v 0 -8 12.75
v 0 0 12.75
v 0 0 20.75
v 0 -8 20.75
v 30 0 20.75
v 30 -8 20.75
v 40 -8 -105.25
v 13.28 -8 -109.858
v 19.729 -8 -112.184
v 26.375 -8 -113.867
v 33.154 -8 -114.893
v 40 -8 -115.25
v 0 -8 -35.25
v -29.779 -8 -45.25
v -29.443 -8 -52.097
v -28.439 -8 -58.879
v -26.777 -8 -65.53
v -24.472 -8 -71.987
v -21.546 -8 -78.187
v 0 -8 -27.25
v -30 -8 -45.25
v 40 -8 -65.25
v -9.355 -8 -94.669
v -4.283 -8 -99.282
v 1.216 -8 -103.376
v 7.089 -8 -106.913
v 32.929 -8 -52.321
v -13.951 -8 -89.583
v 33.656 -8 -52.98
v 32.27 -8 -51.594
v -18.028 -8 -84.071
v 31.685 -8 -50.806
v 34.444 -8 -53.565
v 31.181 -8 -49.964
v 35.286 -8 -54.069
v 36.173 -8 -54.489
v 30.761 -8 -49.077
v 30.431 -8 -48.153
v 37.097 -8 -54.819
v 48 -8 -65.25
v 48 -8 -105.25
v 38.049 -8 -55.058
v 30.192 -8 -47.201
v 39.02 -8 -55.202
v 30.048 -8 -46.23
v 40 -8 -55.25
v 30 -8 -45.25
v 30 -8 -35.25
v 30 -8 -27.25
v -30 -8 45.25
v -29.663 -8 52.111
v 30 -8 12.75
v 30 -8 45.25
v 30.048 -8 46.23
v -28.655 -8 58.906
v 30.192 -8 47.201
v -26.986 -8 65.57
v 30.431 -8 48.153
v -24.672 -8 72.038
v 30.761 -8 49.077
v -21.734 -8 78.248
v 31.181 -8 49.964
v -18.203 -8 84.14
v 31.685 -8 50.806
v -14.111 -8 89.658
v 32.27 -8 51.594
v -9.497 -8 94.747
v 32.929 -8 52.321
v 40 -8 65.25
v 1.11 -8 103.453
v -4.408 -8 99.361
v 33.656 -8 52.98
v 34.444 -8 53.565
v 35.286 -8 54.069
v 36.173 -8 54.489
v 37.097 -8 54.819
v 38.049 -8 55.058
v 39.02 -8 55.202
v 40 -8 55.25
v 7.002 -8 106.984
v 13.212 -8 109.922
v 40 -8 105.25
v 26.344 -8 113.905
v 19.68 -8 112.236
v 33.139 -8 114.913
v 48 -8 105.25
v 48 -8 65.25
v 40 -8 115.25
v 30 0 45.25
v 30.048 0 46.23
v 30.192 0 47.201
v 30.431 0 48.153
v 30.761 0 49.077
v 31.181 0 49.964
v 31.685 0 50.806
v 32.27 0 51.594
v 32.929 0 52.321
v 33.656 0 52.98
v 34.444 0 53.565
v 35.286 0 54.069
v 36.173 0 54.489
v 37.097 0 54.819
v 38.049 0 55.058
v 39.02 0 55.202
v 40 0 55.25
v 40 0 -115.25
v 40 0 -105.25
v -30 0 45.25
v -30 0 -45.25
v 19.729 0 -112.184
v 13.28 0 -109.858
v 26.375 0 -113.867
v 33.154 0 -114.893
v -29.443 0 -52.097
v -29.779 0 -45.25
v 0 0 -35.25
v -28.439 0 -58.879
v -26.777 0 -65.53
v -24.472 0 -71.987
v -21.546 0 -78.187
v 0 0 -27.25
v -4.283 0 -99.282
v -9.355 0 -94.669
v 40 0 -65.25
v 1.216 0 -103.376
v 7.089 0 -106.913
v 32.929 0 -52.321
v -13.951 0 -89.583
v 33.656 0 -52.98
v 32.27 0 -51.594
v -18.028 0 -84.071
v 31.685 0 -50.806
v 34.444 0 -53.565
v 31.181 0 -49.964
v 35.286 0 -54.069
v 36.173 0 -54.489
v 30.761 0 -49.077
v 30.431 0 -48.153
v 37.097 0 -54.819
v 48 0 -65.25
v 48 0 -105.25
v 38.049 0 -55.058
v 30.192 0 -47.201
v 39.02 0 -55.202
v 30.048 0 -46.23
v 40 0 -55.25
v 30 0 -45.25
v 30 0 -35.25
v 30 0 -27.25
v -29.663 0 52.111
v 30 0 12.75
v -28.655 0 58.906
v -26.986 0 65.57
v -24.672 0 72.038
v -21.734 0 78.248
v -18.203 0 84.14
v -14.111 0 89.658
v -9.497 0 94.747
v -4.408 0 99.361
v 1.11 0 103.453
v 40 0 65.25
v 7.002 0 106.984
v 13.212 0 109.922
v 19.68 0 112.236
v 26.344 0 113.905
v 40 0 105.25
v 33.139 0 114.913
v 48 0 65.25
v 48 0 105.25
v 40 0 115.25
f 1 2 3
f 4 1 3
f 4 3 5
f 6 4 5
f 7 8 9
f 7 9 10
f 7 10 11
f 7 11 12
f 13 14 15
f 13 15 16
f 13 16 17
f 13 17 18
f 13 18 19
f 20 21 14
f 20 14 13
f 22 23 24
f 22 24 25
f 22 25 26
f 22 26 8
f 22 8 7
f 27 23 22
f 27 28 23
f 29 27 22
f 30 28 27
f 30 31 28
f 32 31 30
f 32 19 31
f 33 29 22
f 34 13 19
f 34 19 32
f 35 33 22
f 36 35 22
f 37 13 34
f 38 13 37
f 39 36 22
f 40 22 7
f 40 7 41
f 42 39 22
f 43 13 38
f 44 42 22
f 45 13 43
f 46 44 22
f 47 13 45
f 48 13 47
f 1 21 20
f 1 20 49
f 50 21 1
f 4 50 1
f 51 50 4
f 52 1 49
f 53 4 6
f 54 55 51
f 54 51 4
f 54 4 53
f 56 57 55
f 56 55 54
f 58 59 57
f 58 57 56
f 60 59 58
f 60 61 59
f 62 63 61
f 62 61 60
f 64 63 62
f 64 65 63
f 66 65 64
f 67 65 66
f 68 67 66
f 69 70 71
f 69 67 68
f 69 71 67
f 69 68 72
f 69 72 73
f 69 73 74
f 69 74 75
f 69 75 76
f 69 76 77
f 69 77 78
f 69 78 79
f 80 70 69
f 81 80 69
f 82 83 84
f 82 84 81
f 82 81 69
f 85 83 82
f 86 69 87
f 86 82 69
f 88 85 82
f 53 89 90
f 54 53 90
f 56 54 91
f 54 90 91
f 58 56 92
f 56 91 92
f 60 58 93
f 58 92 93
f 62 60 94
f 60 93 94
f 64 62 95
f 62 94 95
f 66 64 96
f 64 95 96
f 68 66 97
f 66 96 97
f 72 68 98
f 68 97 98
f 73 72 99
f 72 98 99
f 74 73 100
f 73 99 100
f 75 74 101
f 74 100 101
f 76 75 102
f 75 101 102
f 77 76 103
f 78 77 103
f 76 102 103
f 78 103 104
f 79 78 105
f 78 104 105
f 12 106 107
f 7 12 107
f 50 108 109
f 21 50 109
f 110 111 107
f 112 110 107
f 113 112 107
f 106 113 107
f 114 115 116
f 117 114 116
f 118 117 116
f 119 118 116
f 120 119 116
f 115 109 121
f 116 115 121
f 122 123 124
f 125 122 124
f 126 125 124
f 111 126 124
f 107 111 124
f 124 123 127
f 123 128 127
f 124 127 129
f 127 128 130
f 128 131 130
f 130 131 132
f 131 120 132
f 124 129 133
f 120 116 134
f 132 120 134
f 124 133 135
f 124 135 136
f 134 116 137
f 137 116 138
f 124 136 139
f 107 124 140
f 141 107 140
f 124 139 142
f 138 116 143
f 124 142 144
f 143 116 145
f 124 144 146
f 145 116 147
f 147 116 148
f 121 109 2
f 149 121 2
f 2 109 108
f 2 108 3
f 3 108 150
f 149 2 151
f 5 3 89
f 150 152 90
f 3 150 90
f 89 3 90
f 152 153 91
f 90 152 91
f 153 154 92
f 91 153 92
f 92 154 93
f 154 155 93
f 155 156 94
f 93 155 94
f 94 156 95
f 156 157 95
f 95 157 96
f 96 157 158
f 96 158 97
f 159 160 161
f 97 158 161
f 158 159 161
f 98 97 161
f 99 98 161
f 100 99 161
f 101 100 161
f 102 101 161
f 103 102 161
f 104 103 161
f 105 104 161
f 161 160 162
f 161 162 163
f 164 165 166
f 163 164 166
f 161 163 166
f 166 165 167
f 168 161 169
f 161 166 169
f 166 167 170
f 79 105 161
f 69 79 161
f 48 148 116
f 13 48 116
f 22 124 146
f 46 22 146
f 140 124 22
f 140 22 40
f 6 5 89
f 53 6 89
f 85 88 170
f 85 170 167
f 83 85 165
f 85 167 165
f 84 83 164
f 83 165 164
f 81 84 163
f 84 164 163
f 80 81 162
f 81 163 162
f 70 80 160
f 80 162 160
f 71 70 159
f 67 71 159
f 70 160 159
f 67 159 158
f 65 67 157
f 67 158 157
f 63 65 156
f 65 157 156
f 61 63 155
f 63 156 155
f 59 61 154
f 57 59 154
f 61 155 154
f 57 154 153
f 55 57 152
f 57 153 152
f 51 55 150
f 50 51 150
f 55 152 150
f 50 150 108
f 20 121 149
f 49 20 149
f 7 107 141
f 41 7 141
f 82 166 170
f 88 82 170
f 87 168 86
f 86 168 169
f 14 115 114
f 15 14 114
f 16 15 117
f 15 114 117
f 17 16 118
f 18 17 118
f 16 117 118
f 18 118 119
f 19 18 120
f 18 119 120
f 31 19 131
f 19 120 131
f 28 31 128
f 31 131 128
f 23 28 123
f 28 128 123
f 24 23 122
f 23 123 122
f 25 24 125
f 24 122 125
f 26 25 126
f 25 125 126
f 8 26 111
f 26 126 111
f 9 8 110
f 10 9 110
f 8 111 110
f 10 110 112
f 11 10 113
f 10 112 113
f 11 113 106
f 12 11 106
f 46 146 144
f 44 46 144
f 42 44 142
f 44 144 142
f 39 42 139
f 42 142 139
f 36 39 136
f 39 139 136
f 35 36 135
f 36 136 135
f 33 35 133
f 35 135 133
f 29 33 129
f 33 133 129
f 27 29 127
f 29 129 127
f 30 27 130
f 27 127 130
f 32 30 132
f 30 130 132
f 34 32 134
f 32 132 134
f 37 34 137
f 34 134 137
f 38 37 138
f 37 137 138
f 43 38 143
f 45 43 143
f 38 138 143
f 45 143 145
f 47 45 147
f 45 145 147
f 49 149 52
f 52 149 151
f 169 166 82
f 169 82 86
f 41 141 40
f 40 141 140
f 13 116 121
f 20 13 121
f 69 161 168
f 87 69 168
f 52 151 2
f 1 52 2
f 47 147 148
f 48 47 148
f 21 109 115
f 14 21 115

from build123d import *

# Parameters (mm, degrees)
F0_W     = 8
F0_H     = 40
F1_DEPTH = 8


# Not quite as in the source:
# - ends of sketch curves that miss each other by under 0.0002 mm in the source are joined


with BuildPart() as f1:
    # F0 (on Front) → F1 (new body)
    with BuildSketch(Plane.XZ):
        with Locations((44, 85.25)):
            Rectangle(F0_W, F0_H)
        with Locations((44, -85.25)):
            Rectangle(F0_W, F0_H)
        with BuildLine():
            Line((30, -45.25), (-29.7788833363, -45.25))
            ThreePointArc((-29.7788833363, -45.25), (-9.3545962046, -94.6694618691), (40, -115.25))
            Line((40, -115.25), (40, -105.25))
            Line((40, -105.25), (40, -65.25))
            Line((40, -65.25), (40, -55.25))
            ThreePointArc((40, -55.25), (32.9289321881, -52.3210678119), (30, -45.25))
        make_face()
        with BuildLine():
            ThreePointArc((40, 115.25), (-9.4974751888, 94.7474741773), (-30, 45.2499985695))
            Line((-30, 45.2499985695), (30, 45.25))
            ThreePointArc((30, 45.25), (32.9289321881, 52.3210678119), (40, 55.25))
            Line((40, 55.25), (40, 65.25))
            Line((40, 65.25), (40, 105.25))
            Line((40, 105.25), (40, 115.25))
        make_face()
        Polygon((-30, 45.25), (-30, -45.25), (-29.7788833363, -45.25), (30, -45.25), (30, -35.25), (0, -35.25), (0, -27.25), (30, -27.25), (30, 12.75), (0, 12.75), (0, 20.75), (30, 20.75), (30, 45.25), align=None)
    extrude(amount=F1_DEPTH)


solid = f1.part
